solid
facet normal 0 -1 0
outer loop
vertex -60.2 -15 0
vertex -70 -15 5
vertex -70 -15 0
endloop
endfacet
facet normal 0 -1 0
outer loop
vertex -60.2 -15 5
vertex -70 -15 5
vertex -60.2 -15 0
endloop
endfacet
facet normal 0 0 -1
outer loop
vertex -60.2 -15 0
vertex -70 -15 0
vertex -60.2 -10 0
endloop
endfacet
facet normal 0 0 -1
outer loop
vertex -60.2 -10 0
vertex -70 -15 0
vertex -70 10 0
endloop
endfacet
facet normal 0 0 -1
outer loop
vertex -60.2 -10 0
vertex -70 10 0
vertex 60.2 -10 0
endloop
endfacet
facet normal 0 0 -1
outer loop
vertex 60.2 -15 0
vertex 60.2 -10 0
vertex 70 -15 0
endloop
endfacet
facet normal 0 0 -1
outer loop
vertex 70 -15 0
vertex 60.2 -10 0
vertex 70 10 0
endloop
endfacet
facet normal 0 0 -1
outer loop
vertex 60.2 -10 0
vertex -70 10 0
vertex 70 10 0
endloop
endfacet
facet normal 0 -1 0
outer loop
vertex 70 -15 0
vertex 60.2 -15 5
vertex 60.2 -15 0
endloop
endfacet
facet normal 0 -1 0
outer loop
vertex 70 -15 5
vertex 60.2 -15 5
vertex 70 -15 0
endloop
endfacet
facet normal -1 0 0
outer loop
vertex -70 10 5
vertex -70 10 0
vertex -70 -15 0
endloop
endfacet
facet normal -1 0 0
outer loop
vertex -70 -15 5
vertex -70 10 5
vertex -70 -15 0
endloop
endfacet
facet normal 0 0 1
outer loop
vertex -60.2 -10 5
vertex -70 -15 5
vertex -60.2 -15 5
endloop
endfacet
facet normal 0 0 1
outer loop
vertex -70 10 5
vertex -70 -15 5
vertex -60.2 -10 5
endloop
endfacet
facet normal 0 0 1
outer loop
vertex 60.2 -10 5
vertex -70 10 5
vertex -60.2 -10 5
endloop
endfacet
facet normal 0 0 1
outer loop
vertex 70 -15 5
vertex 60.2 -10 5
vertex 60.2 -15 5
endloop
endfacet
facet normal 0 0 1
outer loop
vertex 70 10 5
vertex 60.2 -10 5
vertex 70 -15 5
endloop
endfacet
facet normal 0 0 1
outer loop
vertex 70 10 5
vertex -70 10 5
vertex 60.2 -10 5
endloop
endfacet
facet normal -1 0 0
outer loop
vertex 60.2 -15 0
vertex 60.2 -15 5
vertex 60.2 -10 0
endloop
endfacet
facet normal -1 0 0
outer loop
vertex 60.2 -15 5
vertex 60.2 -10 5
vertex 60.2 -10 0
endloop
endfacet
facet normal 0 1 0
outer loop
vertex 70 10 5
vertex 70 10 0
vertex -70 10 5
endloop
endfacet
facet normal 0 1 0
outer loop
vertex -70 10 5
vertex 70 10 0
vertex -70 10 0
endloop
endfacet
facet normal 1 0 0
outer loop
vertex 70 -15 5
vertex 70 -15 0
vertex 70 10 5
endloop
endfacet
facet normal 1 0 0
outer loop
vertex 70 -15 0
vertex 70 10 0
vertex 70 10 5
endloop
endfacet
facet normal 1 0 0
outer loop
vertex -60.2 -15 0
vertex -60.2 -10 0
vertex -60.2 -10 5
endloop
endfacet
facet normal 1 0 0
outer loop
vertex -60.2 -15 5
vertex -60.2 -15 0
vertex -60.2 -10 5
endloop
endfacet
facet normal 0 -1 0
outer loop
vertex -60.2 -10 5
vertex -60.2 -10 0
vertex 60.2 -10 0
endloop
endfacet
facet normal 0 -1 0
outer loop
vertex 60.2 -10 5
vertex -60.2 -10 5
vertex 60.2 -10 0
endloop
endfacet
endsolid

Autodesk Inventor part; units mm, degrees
ref_plane "YZ Plane" through (0, 0, 0) normal (1, 0, 0) x (0, 1, 0)
ref_plane "XZ Plane" through (0, 0, 0) normal (0, 1, 0) x (-1, 0, 0)
ref_plane "XY Plane" through (0, 0, 0) normal (0, 0, 1) x (1, 0, 0)
sketch "Sketch1" plane through (0, 0, 0) normal (0, 0, 1) x (1, 0, 0)
  line L0 (-70, -10) -> (70, -10)
  line L1 (70, -10) -> (70, 10)
  line L2 (70, 10) -> (-70, 10)
  line L3 (-70, 10) -> (-70, -10)
  point P0 (0, 0)
  dimension "width" = 140
  dimension "d1" = 70
  dimension "d2" = 20
  dimension "d3" = 10
extrude "Extrusion1" add sketch "Sketch1" along normal blind 5
sketch "Sketch3" plane through (-70, -10, 0) normal (0, -1, 0) x (1, 0, 0)
  line L0 (0, 0) -> (140, 0) projected
  line L1 (0, 5) -> (140, 5) projected
  line L2 (0, 0) -> (9.8, 0)
  line L3 (9.8, 0) -> (9.8, 5)
  line L4 (9.8, 5) -> (0, 5)
  line L5 (0, 5) -> (0, 0)
  point P0 (70, 0)
  dimension "d28" = 9.8
extrude "Extrusion3" add sketch "Sketch3" along normal blind 5
mirror "Mirror1" about plane through (0, 0, 0) normal (1, 0, 0) of "Extrusion3"
equation "\"d1\" = 0.5 * width"
equation "\"d3\" = 0.5 * d2"
properties part number "EBF_004.1-back-plate_cup-holder"
